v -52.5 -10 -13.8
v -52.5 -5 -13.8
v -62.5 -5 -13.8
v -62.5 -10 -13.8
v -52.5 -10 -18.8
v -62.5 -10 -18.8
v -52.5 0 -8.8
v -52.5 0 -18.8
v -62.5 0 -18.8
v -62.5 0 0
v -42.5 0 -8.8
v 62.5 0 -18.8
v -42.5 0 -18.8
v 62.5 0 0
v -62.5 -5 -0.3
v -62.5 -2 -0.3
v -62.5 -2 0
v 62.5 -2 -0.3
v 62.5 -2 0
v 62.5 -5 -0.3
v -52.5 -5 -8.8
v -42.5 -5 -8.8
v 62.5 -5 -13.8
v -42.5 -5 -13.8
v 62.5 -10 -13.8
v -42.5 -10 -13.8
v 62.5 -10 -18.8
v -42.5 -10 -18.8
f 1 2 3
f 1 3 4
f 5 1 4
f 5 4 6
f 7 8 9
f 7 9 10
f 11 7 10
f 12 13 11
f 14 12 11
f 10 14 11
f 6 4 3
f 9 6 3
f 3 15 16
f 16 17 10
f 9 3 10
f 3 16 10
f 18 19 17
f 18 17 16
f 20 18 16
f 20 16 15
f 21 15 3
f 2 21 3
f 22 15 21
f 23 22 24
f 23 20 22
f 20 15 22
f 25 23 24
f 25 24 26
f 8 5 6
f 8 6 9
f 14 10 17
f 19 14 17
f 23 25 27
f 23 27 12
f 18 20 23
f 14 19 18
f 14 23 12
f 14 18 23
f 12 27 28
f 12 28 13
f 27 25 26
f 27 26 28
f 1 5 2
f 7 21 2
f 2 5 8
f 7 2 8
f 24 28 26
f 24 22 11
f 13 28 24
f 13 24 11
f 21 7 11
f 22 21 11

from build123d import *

# Parameters (mm, degrees)
BOX_W                   = 10
BOX_H                   = 10
BOX_DEPTH               = 10
EXTRUDE_DEPTH           = 125
LINK001_PLACEMENT_ANGLE = 270


with BuildPart() as cube:
    # Box → Box (new body)
    with BuildSketch(Plane(origin=(-52.5, -10, -18.8), x_dir=(1, 0, 0), z_dir=(0, 0, 1))):
        with Locations((5, 5)):
            Rectangle(BOX_W, BOX_H)
    extrude(amount=BOX_DEPTH)


with BuildPart() as cut:
    # Sketch001 → Extrude (new body)
    with BuildSketch(Plane.XZ):
        Polygon((-60.5, 0), (-60.5, -0.3), (-57.5, -0.3), (-57.5, -13.8), (-52.5, -13.8), (-52.5, -18.8), (-62.5, -18.8), (-62.5, 0), align=None)
    extrude(amount=EXTRUDE_DEPTH)


with BuildPart() as cut_1:
    # Link001 placement: moved
    add(cut.part.moved(Location((62.5, -62.5, 0))).rotate(Axis((62.5, -62.5, 0), (0, 0, 1)), LINK001_PLACEMENT_ANGLE))

    # Cut: cut Cube
    add(cube.part, mode=Mode.SUBTRACT)


solid = cut_1.part
